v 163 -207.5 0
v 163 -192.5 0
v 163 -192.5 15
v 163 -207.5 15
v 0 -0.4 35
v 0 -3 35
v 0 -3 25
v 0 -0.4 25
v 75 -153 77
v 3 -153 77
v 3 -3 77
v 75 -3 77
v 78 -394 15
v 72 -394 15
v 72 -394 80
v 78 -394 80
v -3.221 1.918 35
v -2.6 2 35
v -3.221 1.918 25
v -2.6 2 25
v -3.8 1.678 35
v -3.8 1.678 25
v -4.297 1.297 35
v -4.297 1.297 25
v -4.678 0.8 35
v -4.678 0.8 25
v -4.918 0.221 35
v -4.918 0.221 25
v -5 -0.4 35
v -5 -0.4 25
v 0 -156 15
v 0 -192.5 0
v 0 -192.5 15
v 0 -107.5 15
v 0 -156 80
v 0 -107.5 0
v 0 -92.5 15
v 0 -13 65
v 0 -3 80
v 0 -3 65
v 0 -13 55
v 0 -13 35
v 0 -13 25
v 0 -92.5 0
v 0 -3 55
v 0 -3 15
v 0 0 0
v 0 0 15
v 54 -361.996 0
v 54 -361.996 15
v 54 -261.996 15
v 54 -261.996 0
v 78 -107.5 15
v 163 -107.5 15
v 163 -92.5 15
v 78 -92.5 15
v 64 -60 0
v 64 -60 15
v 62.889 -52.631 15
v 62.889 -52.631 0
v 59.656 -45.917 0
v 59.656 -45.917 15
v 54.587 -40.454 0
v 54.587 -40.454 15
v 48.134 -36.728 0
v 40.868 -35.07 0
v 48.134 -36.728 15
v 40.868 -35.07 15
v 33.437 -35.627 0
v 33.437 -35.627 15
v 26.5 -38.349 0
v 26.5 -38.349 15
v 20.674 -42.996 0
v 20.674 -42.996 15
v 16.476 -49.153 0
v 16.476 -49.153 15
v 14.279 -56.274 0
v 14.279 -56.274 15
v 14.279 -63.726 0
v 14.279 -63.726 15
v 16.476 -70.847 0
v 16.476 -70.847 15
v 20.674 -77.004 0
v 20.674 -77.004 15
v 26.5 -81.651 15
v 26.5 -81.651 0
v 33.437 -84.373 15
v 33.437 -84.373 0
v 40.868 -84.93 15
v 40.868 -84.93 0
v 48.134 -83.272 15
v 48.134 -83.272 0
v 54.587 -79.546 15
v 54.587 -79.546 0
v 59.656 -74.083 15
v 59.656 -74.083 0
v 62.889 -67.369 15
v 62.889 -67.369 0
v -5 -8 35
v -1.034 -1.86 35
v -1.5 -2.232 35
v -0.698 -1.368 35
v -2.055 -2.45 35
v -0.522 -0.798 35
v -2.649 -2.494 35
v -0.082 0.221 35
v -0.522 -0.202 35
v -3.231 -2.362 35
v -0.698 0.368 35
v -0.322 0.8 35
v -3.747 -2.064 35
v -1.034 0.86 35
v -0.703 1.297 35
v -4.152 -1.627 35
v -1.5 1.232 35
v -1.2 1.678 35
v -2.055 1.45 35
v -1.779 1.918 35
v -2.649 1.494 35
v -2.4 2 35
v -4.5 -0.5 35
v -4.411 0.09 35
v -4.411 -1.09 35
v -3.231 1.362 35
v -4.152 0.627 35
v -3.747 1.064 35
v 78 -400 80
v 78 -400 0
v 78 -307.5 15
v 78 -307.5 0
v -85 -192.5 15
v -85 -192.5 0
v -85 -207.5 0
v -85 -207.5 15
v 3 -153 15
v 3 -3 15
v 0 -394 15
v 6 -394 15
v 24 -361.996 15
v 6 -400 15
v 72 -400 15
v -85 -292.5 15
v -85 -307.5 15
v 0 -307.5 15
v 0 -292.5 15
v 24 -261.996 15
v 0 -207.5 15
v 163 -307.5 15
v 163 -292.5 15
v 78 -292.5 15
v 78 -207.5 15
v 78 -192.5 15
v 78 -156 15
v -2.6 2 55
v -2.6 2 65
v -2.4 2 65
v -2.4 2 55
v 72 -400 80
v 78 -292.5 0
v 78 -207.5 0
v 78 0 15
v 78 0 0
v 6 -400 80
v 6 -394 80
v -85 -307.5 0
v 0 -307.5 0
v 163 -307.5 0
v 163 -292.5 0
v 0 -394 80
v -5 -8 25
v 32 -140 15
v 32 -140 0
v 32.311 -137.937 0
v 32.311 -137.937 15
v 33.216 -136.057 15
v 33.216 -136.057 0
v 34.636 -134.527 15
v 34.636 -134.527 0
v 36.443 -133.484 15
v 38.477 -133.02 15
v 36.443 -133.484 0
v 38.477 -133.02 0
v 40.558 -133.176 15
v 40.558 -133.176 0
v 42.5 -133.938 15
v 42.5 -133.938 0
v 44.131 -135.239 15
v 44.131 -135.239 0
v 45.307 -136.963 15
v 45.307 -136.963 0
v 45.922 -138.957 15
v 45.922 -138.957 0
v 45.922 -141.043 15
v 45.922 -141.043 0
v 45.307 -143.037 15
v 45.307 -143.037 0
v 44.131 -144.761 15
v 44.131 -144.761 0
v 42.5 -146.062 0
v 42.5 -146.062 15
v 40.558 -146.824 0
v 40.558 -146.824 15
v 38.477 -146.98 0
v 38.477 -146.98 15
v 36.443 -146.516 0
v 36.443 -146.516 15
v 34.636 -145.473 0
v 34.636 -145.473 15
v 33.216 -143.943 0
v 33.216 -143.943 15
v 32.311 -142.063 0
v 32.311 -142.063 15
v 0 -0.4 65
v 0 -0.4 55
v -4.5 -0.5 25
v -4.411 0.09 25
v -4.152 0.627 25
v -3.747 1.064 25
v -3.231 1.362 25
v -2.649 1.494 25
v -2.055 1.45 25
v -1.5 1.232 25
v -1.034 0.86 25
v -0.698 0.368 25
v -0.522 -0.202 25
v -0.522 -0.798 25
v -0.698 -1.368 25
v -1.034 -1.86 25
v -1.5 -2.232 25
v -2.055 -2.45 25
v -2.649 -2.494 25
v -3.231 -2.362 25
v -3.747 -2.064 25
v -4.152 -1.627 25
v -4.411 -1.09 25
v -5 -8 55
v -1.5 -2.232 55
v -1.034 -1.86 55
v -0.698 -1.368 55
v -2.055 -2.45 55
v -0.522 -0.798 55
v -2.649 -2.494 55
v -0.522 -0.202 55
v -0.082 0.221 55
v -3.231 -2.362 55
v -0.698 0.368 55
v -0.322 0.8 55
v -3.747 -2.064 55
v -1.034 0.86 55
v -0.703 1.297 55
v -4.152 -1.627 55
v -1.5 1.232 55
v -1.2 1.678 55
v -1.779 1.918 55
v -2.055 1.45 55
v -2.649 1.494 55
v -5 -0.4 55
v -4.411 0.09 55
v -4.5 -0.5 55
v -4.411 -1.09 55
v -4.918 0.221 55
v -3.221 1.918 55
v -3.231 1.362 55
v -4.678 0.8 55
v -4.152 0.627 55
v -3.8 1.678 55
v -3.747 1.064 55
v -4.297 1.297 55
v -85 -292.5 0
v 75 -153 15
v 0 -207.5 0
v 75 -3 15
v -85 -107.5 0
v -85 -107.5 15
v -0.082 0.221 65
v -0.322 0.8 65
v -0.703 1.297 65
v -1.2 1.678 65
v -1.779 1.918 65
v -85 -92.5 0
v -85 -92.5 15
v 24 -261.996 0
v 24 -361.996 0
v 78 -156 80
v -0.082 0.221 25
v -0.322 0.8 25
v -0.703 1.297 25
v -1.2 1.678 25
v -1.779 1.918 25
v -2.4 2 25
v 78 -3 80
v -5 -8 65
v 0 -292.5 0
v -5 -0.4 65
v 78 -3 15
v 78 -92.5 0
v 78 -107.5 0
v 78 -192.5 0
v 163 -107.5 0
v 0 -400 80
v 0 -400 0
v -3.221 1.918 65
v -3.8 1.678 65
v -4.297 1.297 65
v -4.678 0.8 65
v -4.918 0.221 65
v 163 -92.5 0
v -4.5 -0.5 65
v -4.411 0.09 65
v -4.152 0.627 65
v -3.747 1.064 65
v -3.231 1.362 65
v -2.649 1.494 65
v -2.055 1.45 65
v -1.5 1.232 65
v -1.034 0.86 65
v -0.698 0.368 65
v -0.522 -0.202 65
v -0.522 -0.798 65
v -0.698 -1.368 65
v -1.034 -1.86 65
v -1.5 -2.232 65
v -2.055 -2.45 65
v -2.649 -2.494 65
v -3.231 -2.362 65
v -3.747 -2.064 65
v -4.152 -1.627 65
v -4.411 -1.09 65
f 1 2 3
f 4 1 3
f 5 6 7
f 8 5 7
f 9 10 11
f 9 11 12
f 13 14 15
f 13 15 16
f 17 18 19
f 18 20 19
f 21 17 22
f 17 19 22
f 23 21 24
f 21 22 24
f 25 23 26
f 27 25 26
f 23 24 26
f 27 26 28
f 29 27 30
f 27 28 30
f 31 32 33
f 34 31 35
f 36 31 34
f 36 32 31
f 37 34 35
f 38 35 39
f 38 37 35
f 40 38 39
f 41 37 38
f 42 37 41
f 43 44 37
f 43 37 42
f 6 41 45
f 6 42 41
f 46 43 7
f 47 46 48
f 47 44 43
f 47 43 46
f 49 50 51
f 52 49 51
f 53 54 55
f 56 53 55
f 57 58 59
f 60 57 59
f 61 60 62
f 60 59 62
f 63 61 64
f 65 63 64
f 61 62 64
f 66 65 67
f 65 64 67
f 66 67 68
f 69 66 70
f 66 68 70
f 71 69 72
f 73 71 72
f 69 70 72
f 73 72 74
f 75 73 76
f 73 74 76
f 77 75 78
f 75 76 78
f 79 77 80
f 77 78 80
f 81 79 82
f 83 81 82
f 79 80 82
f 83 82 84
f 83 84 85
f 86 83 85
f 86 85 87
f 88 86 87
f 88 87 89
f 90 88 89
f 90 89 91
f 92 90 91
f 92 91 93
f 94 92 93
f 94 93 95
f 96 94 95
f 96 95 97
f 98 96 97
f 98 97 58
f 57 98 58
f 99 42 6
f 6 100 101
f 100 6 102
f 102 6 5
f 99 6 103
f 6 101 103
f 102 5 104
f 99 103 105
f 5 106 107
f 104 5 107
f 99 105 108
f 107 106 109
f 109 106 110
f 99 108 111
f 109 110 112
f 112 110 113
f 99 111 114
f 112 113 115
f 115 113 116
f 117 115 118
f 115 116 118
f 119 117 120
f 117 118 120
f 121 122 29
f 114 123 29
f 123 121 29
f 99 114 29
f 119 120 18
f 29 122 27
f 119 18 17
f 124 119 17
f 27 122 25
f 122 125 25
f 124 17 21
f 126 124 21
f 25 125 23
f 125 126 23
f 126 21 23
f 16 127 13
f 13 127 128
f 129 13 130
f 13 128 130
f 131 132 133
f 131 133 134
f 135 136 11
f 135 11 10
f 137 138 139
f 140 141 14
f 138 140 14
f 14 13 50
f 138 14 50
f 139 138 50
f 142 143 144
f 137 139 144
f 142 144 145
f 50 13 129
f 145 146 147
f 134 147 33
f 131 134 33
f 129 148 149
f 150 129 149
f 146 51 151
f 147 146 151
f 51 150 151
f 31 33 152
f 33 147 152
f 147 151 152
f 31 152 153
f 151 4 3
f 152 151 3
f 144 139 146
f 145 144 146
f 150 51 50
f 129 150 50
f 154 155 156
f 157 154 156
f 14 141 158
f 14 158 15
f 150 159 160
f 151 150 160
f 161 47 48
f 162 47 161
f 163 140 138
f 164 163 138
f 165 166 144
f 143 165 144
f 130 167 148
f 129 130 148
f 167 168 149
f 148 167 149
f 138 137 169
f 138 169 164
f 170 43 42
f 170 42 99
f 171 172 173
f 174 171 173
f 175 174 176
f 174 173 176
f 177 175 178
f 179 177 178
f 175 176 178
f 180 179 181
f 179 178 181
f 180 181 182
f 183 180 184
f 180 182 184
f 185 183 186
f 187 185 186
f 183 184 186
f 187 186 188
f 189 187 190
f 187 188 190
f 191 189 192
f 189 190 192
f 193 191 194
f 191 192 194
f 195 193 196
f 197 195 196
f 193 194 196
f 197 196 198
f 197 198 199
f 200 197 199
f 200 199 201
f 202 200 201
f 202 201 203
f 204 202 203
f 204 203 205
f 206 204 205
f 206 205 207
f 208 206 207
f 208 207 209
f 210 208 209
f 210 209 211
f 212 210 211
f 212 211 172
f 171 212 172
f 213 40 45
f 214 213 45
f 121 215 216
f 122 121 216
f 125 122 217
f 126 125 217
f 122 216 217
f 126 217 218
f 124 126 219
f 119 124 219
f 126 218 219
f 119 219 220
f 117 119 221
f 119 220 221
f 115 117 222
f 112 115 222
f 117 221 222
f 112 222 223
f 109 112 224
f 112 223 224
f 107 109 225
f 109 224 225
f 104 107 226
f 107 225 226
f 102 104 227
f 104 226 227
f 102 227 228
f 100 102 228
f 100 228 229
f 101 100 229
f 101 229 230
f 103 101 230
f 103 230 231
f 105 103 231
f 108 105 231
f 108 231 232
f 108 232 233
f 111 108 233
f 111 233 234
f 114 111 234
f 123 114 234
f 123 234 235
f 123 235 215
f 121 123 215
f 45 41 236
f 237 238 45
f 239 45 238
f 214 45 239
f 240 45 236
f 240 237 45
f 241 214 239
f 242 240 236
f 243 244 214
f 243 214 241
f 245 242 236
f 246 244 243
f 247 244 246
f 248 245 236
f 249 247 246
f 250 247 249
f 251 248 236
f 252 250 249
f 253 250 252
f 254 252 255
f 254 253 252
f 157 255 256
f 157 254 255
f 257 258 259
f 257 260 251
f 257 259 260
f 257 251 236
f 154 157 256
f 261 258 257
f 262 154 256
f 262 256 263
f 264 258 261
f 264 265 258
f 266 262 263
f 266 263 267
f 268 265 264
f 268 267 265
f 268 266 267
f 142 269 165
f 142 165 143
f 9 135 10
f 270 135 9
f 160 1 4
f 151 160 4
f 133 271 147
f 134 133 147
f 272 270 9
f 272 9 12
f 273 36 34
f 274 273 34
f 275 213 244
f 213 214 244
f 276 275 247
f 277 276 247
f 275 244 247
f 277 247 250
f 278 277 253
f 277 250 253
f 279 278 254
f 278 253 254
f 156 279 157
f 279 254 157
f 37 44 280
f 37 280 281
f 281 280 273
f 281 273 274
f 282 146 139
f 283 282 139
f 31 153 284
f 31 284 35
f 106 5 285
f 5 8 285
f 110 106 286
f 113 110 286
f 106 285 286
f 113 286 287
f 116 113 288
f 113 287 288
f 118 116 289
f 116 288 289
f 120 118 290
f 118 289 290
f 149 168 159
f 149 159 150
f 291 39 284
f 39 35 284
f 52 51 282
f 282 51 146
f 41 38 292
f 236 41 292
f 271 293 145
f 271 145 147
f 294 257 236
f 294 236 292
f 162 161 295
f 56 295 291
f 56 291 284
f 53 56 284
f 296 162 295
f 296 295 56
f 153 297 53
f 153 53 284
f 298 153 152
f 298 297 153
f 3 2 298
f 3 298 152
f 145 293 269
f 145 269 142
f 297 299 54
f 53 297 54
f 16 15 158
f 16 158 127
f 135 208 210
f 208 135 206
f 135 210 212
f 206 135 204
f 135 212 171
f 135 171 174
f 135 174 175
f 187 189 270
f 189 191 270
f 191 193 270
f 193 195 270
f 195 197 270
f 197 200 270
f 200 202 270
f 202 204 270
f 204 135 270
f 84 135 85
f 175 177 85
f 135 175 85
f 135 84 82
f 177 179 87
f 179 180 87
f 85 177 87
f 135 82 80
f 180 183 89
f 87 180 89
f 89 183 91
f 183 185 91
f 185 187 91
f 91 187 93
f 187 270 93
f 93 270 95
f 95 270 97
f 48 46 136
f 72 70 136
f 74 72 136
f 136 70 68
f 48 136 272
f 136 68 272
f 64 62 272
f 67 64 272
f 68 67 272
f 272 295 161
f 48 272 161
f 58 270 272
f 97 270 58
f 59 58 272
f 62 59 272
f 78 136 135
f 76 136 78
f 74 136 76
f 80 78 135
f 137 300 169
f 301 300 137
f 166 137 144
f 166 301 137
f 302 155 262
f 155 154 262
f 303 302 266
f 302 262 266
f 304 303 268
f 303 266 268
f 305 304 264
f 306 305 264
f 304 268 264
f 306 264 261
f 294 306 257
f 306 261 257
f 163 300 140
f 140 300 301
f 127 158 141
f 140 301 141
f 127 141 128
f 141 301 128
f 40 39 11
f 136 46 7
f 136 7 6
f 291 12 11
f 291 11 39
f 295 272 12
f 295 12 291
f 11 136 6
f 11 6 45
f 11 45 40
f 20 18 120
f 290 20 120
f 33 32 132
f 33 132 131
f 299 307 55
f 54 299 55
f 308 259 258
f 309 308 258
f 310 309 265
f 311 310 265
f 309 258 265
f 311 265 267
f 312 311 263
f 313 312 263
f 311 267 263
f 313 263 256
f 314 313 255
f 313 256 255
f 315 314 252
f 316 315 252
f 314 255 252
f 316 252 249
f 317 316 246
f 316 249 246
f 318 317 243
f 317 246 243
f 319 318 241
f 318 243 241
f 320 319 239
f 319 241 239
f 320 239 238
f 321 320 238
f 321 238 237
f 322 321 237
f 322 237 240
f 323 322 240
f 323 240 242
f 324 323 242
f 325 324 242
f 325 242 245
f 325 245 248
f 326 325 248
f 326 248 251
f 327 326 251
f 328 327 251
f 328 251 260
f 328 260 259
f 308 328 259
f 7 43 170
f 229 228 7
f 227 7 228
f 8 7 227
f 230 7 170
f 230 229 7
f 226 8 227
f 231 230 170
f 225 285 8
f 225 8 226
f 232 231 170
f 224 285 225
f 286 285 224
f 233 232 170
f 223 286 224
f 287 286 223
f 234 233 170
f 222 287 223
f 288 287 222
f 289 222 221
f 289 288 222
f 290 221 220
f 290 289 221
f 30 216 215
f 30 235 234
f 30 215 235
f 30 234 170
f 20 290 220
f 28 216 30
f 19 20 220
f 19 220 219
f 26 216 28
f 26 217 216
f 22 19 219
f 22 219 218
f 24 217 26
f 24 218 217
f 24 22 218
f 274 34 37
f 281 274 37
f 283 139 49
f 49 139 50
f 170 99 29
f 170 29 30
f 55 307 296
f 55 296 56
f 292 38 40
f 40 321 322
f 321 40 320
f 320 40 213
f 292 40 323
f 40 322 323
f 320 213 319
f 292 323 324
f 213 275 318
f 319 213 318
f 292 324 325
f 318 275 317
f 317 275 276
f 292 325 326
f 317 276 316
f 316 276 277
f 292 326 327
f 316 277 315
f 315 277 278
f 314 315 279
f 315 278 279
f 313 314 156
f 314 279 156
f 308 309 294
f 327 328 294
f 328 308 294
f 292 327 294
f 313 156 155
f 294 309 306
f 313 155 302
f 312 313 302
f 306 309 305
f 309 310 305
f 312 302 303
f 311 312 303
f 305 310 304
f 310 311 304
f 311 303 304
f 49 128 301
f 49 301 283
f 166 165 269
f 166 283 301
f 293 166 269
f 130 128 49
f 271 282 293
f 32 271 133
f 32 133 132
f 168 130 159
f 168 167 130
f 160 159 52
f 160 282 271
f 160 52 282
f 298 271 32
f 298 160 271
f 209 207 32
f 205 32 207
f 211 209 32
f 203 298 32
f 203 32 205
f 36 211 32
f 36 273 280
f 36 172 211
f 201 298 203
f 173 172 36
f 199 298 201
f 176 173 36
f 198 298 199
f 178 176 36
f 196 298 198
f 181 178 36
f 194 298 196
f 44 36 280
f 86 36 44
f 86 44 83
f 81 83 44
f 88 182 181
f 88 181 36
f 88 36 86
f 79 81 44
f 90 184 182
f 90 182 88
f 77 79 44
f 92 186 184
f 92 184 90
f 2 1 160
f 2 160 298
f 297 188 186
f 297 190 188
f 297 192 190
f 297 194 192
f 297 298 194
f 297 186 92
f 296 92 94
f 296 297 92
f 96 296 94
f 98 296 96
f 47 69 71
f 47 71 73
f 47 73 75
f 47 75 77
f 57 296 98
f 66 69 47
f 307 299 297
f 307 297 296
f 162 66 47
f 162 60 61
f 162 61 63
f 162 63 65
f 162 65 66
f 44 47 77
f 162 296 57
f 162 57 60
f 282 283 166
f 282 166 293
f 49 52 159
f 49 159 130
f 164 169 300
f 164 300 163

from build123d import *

# Parameters (mm, degrees)
IZIM1_W                          = 78
IZIM1_H                          = 400
Y_KSEKLIK_EKSTR_ZYON1_DEPTH      = 15
IZIM2_R                          = 25
KES_EKSTR_ZYON1_DEPTH            = 30
Y_KSEKLIK_EKSTR_ZYON2_DEPTH      = 85
Y_KSEKLIK_EKSTR_ZYON2_DEPTH_BACK = 163
IZIM3_W                          = 15
IZIM3_H                          = 15
KES_EKSTR_ZYON2_DEPTH            = 26
IZIM5_W                          = 6
IZIM5_H                          = 6
Y_KSEKLIK_EKSTR_ZYON3_DEPTH      = 65
IZIM6_R                          = 7
KES_EKSTR_ZYON3_DEPTH            = 65
IZIM8_W                          = 72
IZIM8_H                          = 3
Y_KSEKLIK_EKSTR_ZYON4_DEPTH      = 150
IZIM9_W                          = 10
IZIM9_H                          = 5
Y_KSEKLIK_EKSTR_ZYON5_DEPTH      = 5
IZIM12_W                         = 5
IZIM12_H                         = 10
Y_KSEKLIK_EKSTR_ZYON6_DEPTH      = 5
Y_KSEKLIK_EKSTR_ZYON7_DEPTH      = 10
Y_KSEKLIK_EKSTR_ZYON8_DEPTH      = 10
IZIM15_R                         = 2
KES_EKSTR_ZYON5_DEPTH            = 46
RADYUS1_R                        = 2.4
RADYUS2_R                        = 2.4
RADYUS3_R                        = 2.4
RADYUS4_R                        = 2.4


with BuildPart() as part:
    # Çizim1 → Yükseklik-Ekstrüzyon1 (new body)
    with BuildSketch(Plane.XY):
        with Locations((39, -200)):
            Rectangle(IZIM1_W, IZIM1_H)
    extrude(amount=Y_KSEKLIK_EKSTR_ZYON1_DEPTH)

    # Çizim2 → Kes-Ekstrüzyon1 (cut)
    with BuildSketch(Plane.XY.offset(15)):
        with Locations((39, -60)):
            Circle(IZIM2_R)
    extrude(amount=-KES_EKSTR_ZYON1_DEPTH, mode=Mode.SUBTRACT)

    # Çizim3 → Yükseklik-Ekstrüzyon2 (add, two sides: drawn at the far end of the back side and taken through both)
    with BuildSketch(Plane.ZY.offset(-Y_KSEKLIK_EKSTR_ZYON2_DEPTH_BACK)):
        with Locations((7.5, -200)):
            Rectangle(IZIM3_W, IZIM3_H)
        with Locations((7.5, -100)):
            Rectangle(IZIM3_W, IZIM3_H)
        with Locations((7.5, -300)):
            Rectangle(IZIM3_W, IZIM3_H)
    extrude(amount=Y_KSEKLIK_EKSTR_ZYON2_DEPTH + Y_KSEKLIK_EKSTR_ZYON2_DEPTH_BACK)

    # Çizim4 → Kes-Ekstrüzyon2 (cut)
    with BuildSketch(Plane.XY.offset(15)):
        Polygon((24, -261.99590857), (24, -361.99590857), (39, -361.99590857), (54, -361.99590857), (54, -261.99590857), align=None)
    extrude(amount=-KES_EKSTR_ZYON2_DEPTH, mode=Mode.SUBTRACT)

    # Çizim5 → Yükseklik-Ekstrüzyon3 (add)
    with BuildSketch(Plane.XY.offset(15)):
        Polygon((75, -3), (78, -3), (78, -156), (0, -156), (0, -3), (3, -3), (3, -153), (75, -153), align=None)
        with Locations((3, -397)):
            Rectangle(IZIM5_W, IZIM5_H)
        with Locations((75, -397)):
            Rectangle(IZIM5_W, IZIM5_H)
    extrude(amount=Y_KSEKLIK_EKSTR_ZYON3_DEPTH)

    # Çizim6 → Kes-Ekstrüzyon3 (cut)
    with BuildSketch(Plane(origin=(0, 0, 0), x_dir=(-1, 0, 0), z_dir=(0, 0, -1))):
        with Locations((-39, -140)):
            Circle(IZIM6_R)
    extrude(amount=-KES_EKSTR_ZYON3_DEPTH, mode=Mode.SUBTRACT)

    # Çizim8 → Yükseklik-Ekstrüzyon4 (add)
    with BuildSketch(Plane(origin=(0, -153, 0), x_dir=(1, 0, 0), z_dir=(0, 1, 0))):
        with Locations((39, -78.5)):
            Rectangle(IZIM8_W, IZIM8_H)
    extrude(amount=Y_KSEKLIK_EKSTR_ZYON4_DEPTH)

    # Çizim9 → Yükseklik-Ekstrüzyon5 (add)
    with BuildSketch(Plane.ZY):
        with Locations((60, -5.5)):
            Rectangle(IZIM9_W, IZIM9_H)
        with Locations((30, -5.5)):
            Rectangle(IZIM9_W, IZIM9_H)
    extrude(amount=Y_KSEKLIK_EKSTR_ZYON5_DEPTH)

    # Çizim12 → Yükseklik-Ekstrüzyon6 (add)
    with BuildSketch(Plane(origin=(0, -3, 0), x_dir=(1, 0, 0), z_dir=(0, 1, 0))):
        with Locations((-2.5, -30)):
            Rectangle(IZIM12_W, IZIM12_H)
        with Locations((-2.5, -60)):
            Rectangle(IZIM12_W, IZIM12_H)
    extrude(amount=Y_KSEKLIK_EKSTR_ZYON6_DEPTH)

    # Çizim13 → Yükseklik-Ekstrüzyon7 (add)
    with BuildSketch(Plane.XY.offset(65)):
        Polygon((-5, -8), (0, -8), (0, -13), align=None)
    extrude(amount=-Y_KSEKLIK_EKSTR_ZYON7_DEPTH)

    # Çizim14 → Yükseklik-Ekstrüzyon8 (add)
    with BuildSketch(Plane(origin=(0, 0, 25), x_dir=(-1, 0, 0), z_dir=(0, 0, -1))):
        Polygon((0, -8), (0, -13), (5, -8), align=None)
    extrude(amount=-Y_KSEKLIK_EKSTR_ZYON8_DEPTH)

    # Çizim15 → Kes-Ekstrüzyon5 (cut)
    with BuildSketch(Plane(origin=(0, 0, 25), x_dir=(-1, 0, 0), z_dir=(0, 0, -1))):
        with Locations((2.5, -0.5)):
            Circle(IZIM15_R)
    extrude(amount=-KES_EKSTR_ZYON5_DEPTH, mode=Mode.SUBTRACT)

    # Radyus1
    radyus1_edges = [part.edges().sort_by_distance(p)[0] for p in [
        (0, 2, 60),
    ]]
    fillet(radyus1_edges, radius=RADYUS1_R)

    # Radyus2
    radyus2_edges = [part.edges().sort_by_distance(p)[0] for p in [
        (0, 2, 30),
    ]]
    fillet(radyus2_edges, radius=RADYUS2_R)

    # Radyus3
    radyus3_edges = [part.edges().sort_by_distance(p)[0] for p in [
        (-5, 2, 30),
    ]]
    fillet(radyus3_edges, radius=RADYUS3_R)

    # Radyus4
    radyus4_edges = [part.edges().sort_by_distance(p)[0] for p in [
        (-5, 2, 60),
    ]]
    fillet(radyus4_edges, radius=RADYUS4_R)


solid = part.part
